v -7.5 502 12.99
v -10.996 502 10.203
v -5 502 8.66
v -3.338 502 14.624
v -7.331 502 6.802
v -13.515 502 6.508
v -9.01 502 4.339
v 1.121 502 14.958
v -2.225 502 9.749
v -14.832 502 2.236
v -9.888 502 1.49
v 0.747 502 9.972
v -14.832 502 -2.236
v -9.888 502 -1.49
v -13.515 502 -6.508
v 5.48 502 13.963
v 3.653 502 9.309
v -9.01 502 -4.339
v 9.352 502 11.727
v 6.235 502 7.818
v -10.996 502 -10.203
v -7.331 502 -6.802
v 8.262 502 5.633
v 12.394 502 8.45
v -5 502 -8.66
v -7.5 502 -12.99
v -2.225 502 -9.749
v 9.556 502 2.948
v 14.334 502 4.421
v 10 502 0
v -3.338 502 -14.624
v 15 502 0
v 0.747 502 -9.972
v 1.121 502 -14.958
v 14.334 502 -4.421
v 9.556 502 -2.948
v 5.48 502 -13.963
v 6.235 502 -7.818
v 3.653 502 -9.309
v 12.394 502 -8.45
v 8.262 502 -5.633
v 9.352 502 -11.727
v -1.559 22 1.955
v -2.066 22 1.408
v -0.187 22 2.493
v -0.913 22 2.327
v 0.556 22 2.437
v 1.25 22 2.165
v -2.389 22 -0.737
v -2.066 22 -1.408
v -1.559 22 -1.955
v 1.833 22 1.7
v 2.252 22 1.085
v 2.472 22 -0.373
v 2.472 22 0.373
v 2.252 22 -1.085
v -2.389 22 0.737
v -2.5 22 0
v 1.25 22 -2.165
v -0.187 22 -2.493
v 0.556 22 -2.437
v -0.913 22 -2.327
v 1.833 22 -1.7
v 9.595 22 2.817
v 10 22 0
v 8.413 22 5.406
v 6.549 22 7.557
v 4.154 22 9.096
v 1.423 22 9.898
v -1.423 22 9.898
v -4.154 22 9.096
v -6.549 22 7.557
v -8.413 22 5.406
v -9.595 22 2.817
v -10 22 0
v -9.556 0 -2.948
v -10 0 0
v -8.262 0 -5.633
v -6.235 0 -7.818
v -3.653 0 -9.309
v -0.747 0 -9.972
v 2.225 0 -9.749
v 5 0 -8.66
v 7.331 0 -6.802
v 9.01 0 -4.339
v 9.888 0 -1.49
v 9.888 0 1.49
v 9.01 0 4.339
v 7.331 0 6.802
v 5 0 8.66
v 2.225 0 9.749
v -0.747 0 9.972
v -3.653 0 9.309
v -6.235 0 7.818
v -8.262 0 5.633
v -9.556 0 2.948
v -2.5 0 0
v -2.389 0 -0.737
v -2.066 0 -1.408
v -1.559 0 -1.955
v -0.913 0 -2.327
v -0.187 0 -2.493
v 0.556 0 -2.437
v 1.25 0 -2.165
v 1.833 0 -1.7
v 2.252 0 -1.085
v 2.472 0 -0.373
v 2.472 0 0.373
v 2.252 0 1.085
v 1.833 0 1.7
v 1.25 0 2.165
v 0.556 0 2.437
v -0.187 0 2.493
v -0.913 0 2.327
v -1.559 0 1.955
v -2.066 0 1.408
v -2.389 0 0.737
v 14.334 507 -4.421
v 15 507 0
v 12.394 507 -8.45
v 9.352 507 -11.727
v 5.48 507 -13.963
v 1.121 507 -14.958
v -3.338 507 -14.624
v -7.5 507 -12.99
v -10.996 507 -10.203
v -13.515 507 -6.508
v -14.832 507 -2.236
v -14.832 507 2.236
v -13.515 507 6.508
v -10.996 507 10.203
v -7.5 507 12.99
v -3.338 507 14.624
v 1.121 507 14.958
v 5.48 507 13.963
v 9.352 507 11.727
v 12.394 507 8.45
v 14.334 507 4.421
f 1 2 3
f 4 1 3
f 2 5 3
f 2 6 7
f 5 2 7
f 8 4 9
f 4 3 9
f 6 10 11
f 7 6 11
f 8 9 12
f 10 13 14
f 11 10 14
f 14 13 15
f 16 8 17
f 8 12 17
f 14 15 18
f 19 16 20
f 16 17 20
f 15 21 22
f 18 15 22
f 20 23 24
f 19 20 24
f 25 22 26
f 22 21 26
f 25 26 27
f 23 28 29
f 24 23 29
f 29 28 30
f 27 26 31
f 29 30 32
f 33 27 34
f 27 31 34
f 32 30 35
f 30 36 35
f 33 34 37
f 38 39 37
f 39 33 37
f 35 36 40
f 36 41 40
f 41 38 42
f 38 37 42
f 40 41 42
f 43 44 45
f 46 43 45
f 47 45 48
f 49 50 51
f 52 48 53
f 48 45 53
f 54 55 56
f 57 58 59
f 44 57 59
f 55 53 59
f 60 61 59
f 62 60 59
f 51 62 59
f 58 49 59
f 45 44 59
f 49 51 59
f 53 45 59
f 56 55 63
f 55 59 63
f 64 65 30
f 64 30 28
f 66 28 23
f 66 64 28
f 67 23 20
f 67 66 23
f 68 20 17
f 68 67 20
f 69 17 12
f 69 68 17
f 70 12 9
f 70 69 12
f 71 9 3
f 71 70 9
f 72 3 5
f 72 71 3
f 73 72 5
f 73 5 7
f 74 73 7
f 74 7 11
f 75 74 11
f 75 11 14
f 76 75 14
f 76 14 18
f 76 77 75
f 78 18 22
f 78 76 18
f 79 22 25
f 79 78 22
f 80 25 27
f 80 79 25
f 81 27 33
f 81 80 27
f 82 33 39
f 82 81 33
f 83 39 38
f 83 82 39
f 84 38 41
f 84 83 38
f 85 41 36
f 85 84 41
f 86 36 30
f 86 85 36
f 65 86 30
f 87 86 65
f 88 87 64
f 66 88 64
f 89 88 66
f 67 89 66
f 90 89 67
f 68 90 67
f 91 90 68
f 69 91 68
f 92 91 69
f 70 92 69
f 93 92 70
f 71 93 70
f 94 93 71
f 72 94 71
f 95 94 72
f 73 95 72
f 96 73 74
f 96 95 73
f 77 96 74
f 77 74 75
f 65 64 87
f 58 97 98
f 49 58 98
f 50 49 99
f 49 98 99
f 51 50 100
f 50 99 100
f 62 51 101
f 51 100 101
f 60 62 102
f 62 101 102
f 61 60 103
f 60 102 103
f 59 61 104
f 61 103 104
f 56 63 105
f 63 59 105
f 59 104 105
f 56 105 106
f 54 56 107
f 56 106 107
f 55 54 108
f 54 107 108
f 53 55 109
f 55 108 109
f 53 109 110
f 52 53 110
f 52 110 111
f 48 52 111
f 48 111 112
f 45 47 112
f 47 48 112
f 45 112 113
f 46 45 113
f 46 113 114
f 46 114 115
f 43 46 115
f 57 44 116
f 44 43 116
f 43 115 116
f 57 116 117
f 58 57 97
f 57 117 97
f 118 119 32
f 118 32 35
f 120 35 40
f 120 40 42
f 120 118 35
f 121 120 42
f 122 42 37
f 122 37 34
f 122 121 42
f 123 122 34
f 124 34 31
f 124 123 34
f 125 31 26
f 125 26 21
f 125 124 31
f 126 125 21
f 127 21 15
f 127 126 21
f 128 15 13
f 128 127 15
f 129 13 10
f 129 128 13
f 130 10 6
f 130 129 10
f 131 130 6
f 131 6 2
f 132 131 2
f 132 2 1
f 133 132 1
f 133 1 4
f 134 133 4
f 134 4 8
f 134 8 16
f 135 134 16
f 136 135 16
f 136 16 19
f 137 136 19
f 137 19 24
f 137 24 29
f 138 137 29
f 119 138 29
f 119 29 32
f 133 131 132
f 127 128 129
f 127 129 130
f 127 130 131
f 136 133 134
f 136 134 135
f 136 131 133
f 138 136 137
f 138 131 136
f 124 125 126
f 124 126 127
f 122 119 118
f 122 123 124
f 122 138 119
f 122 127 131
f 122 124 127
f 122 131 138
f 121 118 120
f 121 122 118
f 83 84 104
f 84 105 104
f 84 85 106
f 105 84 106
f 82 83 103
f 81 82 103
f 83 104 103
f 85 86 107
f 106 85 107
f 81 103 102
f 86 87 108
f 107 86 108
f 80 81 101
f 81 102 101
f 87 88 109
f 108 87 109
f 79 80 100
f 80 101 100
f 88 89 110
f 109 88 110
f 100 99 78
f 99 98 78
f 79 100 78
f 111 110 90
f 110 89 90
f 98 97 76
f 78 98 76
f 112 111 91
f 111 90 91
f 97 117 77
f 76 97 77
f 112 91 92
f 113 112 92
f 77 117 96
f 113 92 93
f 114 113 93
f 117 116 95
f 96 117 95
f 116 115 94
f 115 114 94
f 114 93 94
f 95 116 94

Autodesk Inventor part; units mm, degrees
ref_plane "YZ Plane" through (0, 0, 0) normal (1, 0, 0) x (0, 1, 0)
ref_plane "XZ Plane" through (0, 0, 0) normal (0, 1, 0) x (-1, 0, 0)
ref_plane "XY Plane" through (0, 0, 0) normal (0, 0, 1) x (1, 0, 0)
sketch "Эскиз1" plane through (0, 0, 0) normal (0, 1, 0) x (-1, 0, 0)
  circle A0 centre (0, 0) radius 2.5
  circle A1 centre (0, 0) radius 10
  dimension "d0" = 5
  dimension "d1" = 20
extrude "Выдавливание1" add sketch "Эскиз1" along normal blind 22
sketch "Эскиз2" plane through (0, 22, 0) normal (0, 1, 0) x (1, 0, 0)
  circle A0 centre (0, 0) radius 10
extrude "Выдавливание2" add sketch "Эскиз2" along normal blind 485
thread "Резьба1" size "M20x2.5" class "6g" standard "ANSI Metric M Profile" full length
chamfer "Фаска1" distance 2 angle 45 1 edges at (-10, 507, 0)
sketch "Эскиз3" plane through (0, 507, 0) normal (0, 1, 0) x (1, 0, 0)
  circle A0 centre (0, 0) radius 2.5 projected
  circle A1 centre (0, 0) radius 15
  dimension "d11" = 30
extrude "Выдавливание3" add sketch "Эскиз3" against normal blind 5
properties part number "Резьбовой винт"
